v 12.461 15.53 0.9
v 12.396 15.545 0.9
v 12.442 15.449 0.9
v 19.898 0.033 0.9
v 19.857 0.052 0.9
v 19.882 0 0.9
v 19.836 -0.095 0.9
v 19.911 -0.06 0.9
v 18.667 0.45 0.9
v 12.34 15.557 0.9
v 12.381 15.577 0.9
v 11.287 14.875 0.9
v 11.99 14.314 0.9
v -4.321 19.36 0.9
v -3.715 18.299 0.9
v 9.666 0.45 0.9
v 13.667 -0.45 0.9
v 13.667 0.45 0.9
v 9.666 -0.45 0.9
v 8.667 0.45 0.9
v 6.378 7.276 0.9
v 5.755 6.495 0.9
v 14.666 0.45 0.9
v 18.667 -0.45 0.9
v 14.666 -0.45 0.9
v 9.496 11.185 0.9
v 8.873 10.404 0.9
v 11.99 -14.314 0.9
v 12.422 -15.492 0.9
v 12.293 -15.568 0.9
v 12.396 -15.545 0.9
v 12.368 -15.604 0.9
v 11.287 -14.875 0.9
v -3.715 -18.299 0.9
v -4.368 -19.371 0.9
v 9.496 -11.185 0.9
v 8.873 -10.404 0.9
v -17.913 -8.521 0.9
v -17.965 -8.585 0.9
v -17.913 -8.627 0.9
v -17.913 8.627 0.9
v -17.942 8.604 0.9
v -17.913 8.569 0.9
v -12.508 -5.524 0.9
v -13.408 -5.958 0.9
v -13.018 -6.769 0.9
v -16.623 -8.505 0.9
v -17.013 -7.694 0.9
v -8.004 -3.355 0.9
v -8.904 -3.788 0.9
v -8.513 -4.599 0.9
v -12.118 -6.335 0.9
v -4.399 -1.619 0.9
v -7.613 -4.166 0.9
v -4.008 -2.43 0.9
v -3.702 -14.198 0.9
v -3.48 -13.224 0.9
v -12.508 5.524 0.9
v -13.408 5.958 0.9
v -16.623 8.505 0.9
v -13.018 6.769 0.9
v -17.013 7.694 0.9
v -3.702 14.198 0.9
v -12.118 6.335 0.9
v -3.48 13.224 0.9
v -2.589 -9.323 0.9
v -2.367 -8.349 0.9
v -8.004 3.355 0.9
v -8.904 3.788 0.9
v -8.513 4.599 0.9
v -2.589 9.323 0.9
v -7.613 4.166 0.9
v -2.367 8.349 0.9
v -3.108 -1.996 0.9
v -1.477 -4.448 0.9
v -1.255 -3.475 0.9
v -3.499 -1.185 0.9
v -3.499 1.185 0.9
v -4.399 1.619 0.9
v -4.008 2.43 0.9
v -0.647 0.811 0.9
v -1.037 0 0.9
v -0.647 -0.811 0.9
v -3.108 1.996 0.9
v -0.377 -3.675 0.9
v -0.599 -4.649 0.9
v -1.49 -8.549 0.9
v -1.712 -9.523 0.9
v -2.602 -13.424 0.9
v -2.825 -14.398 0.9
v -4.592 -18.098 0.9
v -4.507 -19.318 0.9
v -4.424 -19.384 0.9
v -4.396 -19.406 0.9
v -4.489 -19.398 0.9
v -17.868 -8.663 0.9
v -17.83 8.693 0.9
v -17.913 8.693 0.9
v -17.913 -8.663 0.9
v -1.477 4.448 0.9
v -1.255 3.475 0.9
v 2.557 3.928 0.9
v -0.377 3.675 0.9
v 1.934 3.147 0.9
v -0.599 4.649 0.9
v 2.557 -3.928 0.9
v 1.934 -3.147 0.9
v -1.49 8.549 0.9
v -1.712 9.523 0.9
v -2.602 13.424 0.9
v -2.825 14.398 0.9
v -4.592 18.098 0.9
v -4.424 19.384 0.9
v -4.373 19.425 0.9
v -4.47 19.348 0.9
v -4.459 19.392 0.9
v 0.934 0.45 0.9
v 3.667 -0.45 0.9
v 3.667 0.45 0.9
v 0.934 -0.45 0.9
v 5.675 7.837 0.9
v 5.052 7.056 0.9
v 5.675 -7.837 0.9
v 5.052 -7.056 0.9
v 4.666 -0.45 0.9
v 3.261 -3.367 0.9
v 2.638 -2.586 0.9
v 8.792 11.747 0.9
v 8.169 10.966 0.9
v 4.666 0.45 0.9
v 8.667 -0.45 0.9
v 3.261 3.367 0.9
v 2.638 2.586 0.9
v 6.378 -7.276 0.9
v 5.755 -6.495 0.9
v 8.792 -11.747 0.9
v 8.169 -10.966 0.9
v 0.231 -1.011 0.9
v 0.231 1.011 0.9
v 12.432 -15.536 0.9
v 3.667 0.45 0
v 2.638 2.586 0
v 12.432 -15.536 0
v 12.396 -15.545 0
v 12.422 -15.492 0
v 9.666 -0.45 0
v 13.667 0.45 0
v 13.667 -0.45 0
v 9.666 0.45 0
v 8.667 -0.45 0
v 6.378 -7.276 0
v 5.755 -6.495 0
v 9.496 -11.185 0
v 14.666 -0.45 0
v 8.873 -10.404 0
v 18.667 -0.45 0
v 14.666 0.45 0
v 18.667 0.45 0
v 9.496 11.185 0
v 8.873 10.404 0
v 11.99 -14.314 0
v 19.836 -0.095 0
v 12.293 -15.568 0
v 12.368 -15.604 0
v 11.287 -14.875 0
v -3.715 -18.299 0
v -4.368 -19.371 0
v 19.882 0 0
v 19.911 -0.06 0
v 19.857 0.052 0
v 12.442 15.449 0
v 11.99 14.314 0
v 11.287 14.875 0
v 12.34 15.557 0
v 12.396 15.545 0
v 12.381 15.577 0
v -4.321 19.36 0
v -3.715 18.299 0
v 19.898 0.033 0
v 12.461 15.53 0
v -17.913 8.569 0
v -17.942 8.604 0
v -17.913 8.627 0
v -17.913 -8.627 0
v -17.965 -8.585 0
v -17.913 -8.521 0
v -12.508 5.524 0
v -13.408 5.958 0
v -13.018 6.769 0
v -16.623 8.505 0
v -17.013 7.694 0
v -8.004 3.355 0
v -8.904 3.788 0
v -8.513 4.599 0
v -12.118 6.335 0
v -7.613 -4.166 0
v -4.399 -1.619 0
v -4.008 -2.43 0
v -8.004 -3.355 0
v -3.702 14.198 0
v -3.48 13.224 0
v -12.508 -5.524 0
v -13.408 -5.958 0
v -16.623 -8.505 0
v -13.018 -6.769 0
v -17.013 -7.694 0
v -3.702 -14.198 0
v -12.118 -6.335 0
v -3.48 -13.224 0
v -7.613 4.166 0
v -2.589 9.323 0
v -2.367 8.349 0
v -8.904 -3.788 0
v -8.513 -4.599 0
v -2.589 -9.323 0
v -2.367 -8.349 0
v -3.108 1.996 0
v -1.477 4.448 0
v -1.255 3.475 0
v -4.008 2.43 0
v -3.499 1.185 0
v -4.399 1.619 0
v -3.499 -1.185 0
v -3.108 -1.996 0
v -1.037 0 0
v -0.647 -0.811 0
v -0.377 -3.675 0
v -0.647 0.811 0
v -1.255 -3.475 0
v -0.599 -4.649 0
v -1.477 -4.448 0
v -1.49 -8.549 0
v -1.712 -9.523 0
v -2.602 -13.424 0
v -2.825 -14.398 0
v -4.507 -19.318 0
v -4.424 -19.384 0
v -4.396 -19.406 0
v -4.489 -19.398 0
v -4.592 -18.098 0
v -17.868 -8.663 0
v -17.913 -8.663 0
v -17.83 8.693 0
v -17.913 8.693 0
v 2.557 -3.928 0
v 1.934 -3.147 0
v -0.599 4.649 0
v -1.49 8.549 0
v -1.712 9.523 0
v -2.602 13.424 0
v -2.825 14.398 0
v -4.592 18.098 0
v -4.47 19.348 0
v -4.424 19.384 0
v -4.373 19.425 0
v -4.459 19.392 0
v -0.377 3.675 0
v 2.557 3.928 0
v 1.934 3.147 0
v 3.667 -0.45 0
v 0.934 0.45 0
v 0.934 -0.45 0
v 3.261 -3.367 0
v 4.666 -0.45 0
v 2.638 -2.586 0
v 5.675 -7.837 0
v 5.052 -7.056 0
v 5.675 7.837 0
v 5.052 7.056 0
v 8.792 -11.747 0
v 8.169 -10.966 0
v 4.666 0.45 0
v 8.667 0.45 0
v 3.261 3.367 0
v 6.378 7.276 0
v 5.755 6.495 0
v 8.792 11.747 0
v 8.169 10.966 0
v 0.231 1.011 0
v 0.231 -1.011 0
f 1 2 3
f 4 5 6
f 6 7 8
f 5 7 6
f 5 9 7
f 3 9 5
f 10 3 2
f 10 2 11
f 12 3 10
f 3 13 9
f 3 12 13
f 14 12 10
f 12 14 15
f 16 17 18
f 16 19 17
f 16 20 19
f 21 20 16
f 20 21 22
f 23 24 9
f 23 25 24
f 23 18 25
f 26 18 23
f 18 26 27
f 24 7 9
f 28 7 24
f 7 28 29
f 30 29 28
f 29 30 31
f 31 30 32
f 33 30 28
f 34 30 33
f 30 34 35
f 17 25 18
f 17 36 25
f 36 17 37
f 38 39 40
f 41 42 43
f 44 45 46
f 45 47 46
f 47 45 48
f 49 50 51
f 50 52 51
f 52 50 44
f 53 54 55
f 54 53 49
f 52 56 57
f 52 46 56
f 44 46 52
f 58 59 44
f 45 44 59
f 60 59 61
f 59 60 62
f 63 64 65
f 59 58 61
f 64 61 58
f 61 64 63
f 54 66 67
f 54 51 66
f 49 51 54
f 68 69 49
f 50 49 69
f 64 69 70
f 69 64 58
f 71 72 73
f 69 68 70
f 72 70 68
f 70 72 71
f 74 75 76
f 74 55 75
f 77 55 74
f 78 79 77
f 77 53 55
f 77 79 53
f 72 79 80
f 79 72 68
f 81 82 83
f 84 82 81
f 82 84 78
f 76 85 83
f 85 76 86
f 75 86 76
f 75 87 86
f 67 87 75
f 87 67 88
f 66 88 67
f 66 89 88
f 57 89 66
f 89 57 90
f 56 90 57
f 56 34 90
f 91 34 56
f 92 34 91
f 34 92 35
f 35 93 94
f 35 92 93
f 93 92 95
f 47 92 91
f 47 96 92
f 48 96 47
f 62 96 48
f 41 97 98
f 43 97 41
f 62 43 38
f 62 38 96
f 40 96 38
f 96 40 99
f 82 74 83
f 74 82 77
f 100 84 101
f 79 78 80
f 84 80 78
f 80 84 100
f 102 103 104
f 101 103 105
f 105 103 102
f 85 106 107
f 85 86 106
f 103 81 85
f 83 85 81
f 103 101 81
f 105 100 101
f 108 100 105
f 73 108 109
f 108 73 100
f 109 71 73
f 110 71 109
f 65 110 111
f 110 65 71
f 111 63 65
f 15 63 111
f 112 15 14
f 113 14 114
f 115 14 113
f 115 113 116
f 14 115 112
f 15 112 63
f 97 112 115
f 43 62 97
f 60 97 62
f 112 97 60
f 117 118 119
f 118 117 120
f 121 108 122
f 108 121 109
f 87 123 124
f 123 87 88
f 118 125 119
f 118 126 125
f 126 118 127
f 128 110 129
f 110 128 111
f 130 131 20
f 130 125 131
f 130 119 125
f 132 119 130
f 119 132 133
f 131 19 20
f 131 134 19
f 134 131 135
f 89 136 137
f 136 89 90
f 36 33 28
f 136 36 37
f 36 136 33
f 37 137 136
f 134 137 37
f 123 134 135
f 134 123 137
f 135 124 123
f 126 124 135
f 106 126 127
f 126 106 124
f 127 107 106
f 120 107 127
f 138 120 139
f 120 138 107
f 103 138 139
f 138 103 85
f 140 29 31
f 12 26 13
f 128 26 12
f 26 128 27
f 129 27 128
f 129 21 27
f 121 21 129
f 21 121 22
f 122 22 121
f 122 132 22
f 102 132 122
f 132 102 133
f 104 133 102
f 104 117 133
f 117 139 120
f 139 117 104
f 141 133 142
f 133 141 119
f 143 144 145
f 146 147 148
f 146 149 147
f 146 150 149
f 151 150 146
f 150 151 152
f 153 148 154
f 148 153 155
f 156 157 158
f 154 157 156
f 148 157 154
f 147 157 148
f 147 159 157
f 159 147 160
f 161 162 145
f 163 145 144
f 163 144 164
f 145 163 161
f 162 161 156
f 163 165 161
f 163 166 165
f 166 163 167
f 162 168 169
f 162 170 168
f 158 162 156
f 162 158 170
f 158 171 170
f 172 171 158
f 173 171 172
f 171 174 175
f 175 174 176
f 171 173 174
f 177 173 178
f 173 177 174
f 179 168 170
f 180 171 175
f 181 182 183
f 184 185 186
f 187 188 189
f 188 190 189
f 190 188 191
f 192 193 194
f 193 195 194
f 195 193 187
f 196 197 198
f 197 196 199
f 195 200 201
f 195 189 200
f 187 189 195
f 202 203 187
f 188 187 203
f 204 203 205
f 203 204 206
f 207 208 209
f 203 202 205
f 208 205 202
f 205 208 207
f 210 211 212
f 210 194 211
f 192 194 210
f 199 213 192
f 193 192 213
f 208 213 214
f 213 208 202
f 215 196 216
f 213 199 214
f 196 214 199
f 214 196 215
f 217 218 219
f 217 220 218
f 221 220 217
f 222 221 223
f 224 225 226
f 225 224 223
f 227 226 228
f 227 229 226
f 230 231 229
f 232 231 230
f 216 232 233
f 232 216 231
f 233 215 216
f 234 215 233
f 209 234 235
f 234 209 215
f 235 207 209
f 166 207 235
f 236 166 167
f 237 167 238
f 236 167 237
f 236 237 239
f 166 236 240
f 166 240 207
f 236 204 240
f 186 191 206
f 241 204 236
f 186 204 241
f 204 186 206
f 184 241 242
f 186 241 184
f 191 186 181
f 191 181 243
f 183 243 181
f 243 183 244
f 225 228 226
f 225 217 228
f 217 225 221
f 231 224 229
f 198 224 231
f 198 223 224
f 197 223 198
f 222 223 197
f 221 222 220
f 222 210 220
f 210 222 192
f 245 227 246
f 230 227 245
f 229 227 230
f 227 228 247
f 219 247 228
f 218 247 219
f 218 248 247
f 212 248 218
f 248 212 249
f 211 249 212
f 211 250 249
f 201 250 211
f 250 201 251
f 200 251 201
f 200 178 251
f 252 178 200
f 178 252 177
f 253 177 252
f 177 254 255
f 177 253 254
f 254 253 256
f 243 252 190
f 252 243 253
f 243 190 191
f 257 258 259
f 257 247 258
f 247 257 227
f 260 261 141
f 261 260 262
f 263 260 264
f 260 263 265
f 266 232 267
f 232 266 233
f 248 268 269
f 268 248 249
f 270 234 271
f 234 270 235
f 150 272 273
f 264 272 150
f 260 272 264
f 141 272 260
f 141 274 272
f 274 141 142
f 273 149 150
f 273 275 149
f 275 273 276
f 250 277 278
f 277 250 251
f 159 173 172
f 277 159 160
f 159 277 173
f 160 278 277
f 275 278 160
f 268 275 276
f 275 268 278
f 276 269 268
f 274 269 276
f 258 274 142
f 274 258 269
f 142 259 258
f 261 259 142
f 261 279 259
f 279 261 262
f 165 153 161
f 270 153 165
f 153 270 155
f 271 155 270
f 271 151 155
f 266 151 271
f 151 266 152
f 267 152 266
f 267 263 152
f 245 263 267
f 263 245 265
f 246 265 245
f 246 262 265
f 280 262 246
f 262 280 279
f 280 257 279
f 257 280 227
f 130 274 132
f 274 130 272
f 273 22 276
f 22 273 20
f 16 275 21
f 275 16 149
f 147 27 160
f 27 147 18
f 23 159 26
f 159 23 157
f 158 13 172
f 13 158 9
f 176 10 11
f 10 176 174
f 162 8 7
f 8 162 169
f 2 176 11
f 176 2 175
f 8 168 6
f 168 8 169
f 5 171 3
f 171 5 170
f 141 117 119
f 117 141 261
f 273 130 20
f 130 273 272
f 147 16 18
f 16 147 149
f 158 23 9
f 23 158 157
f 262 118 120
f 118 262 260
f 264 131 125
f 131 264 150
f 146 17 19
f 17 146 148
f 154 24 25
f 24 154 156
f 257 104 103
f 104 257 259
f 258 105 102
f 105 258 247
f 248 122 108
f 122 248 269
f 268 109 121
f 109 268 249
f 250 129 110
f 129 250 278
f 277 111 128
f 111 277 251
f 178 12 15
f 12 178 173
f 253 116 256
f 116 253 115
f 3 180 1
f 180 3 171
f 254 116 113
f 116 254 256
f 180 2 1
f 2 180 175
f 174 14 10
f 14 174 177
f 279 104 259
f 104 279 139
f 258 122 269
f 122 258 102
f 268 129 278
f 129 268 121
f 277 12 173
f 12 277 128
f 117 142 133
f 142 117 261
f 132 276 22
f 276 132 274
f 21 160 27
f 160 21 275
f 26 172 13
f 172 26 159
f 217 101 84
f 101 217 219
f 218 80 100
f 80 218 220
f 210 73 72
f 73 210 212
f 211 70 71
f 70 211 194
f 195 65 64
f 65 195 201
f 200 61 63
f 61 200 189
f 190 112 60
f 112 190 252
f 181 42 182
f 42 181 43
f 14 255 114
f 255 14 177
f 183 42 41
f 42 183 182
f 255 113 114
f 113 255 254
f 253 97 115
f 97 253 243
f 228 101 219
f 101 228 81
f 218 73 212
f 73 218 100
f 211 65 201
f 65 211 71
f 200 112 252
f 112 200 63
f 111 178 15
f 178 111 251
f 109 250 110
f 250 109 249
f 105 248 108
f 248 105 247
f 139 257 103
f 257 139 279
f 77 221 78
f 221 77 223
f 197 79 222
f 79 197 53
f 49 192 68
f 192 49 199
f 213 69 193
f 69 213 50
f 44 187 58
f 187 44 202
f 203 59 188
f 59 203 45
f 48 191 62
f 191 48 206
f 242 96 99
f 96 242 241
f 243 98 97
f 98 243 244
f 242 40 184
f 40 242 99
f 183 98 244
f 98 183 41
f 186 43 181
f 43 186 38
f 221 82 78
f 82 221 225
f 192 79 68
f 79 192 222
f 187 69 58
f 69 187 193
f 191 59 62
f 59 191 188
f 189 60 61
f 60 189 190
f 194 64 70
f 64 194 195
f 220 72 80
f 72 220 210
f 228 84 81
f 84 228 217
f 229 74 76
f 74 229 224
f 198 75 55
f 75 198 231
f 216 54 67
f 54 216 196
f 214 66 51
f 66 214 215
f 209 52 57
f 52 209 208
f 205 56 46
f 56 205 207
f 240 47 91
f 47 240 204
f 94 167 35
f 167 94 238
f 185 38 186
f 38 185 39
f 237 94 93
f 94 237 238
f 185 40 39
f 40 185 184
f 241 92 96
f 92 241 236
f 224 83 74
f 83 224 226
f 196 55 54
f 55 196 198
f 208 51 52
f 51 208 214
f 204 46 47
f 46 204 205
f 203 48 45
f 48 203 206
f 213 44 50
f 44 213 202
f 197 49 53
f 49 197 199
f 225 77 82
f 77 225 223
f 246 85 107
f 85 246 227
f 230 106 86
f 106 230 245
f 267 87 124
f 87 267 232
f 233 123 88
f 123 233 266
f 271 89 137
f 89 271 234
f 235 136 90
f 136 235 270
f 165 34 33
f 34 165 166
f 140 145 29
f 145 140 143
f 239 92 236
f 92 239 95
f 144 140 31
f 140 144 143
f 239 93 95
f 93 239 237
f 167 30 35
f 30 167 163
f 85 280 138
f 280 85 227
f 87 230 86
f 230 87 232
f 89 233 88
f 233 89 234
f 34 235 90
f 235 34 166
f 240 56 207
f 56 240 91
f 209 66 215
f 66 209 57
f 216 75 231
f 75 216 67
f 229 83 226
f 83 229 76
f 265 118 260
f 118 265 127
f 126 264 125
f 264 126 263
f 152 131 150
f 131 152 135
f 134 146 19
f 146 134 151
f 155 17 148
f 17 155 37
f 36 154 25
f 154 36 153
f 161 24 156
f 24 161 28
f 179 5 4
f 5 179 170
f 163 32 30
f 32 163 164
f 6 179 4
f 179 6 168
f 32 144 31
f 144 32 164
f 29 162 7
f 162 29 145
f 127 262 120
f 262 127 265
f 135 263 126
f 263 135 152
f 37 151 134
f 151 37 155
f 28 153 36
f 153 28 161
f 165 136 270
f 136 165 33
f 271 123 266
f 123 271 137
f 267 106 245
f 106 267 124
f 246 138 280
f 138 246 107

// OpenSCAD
//Settings
prongs = 7;
stakes = 4;
line_width = 0.9;
radius = 20;
height = 0.9;

//Calculations.
riblength = 2 * radius * sin(180 / prongs);

for(prong = [0:prongs]) {
	rotate([0, 0, prong / prongs * 360]) {
		translate([-line_width / 2, -line_width / 2, 0]) {
			cube([radius, line_width, height]);
			for(stake = [1:stakes]) {
				translate([radius * stake / stakes - line_width / 2, 0, 0]) {
					rotate([0, 0, 180 / prongs]) {
						cube([line_width, riblength * stake / stakes, height]);
					}
				}
			}
		}
	}
}
